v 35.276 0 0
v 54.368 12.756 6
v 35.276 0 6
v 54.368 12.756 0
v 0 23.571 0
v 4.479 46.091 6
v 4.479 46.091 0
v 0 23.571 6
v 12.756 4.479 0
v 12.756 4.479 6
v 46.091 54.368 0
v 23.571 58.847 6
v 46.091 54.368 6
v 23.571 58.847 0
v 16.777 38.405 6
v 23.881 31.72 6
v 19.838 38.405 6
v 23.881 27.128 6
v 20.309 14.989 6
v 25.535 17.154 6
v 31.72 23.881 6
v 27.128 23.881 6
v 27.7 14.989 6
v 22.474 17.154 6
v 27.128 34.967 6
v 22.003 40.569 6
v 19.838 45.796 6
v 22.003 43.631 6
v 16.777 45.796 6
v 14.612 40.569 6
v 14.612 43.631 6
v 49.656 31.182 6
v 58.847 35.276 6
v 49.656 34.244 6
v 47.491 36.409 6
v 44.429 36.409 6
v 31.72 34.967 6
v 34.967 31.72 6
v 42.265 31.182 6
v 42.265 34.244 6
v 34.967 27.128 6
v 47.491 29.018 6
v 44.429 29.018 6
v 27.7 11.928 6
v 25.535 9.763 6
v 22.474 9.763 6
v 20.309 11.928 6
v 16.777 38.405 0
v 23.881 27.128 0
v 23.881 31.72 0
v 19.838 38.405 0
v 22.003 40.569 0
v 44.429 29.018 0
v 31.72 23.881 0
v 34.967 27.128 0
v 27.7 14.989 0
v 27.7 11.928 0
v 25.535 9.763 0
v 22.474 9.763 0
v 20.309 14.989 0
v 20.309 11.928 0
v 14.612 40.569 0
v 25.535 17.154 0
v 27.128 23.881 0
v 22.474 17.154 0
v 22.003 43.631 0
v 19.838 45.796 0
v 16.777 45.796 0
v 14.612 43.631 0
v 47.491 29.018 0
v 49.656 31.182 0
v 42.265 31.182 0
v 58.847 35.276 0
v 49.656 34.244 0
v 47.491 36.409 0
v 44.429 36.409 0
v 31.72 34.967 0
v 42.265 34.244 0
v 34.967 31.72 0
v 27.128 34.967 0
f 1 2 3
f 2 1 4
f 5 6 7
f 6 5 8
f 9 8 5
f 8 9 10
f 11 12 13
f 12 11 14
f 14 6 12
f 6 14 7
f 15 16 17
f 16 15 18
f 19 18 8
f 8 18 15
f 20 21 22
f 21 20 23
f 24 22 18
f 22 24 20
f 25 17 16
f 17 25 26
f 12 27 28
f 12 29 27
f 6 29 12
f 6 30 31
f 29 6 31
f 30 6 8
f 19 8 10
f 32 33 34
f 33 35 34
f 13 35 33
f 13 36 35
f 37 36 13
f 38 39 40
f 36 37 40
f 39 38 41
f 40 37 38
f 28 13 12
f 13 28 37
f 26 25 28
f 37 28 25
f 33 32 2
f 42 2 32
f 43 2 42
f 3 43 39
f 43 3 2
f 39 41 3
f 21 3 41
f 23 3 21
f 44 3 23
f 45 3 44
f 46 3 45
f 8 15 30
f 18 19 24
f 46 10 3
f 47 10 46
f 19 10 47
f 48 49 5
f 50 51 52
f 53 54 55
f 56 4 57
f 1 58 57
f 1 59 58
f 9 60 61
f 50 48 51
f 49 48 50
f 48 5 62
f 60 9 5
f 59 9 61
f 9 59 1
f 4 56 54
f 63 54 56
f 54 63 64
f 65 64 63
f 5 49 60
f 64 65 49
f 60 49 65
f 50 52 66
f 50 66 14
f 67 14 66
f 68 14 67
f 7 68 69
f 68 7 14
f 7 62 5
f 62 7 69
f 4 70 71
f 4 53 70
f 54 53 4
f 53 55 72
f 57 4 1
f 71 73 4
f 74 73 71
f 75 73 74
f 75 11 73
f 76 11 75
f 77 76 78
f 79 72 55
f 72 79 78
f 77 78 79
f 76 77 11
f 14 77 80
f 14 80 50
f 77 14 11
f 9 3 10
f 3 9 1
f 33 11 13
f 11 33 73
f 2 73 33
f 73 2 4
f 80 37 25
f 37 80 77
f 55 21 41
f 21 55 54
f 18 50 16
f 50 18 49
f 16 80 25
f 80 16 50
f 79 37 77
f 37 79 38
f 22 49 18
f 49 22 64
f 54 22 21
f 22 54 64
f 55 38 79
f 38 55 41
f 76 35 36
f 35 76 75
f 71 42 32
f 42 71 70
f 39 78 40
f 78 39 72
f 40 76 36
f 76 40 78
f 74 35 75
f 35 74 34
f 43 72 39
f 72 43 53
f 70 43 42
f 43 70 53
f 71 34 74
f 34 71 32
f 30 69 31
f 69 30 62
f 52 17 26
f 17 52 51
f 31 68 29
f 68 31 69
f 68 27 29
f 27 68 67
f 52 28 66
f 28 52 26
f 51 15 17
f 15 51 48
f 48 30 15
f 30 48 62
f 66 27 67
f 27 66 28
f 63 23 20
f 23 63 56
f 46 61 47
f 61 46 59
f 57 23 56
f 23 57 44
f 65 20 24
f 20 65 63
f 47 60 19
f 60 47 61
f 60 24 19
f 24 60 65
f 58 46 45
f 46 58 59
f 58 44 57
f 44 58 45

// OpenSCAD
$fn = 32;

// ----------------------------------------------------------------------
// Polygon plate: 8-gon R30, 3 bolt windows
// ----------------------------------------------------------------------

// --- parameters (mm) ---
sides = 8;                // number of polygon sides
plate_r = 30;             // circumscribed radius of the polygon
bore_r = 6;               // centre bore radius
bolts = 3;                // number of bolt windows
ring_r = 16.86;           // bolt-circle radius
bolt_r = 4;               // bolt window radius
plate_t = 6;              // plate thickness, Z (extrusion height)

plate_d = 2 * plate_r;  // circumscribed diameter
bore_d = 2 * bore_r;  // centre bore diameter
bolt_d = 2 * bolt_r;  // bolt window diameter
ring_d = 2 * ring_r;  // bolt-circle diameter

profile = [[58.847, 35.276], [46.091, 54.368], [23.571, 58.847], [4.479, 46.091], [0, 23.571], [12.756, 4.479], [35.276, 0], [54.368, 12.756]];  // primary outline, 8 points, counter clockwise
void_1 = [[34.967, 31.72], [31.72, 34.967], [27.128, 34.967], [23.881, 31.72], [23.881, 27.128], [27.128, 23.881], [31.72, 23.881], [34.967, 27.128]];  // centre bore, 8 points
void_2 = [[49.656, 34.244], [47.491, 36.409], [44.429, 36.409], [42.265, 34.244], [42.265, 31.182], [44.429, 29.018], [47.491, 29.018], [49.656, 31.182]];  // bolt window 1, 8 points
void_3 = [[22.003, 43.631], [19.838, 45.796], [16.777, 45.796], [14.612, 43.631], [14.612, 40.569], [16.777, 38.405], [19.838, 38.405], [22.003, 40.569]];  // bolt window 2, 8 points
void_4 = [[27.7, 14.989], [25.535, 17.154], [22.474, 17.154], [20.309, 14.989], [20.309, 11.928], [22.474, 9.763], [25.535, 9.763], [27.7, 11.928]];  // bolt window 3, 8 points

// --- the one profile operation ---
difference() {
  linear_extrude(height = plate_t) polygon(points = profile);
  translate([0, 0, -1])
    linear_extrude(height = plate_t + 2) polygon(points = void_1);
  translate([0, 0, -1])
    linear_extrude(height = plate_t + 2) polygon(points = void_2);
  translate([0, 0, -1])
    linear_extrude(height = plate_t + 2) polygon(points = void_3);
  translate([0, 0, -1])
    linear_extrude(height = plate_t + 2) polygon(points = void_4);
}
